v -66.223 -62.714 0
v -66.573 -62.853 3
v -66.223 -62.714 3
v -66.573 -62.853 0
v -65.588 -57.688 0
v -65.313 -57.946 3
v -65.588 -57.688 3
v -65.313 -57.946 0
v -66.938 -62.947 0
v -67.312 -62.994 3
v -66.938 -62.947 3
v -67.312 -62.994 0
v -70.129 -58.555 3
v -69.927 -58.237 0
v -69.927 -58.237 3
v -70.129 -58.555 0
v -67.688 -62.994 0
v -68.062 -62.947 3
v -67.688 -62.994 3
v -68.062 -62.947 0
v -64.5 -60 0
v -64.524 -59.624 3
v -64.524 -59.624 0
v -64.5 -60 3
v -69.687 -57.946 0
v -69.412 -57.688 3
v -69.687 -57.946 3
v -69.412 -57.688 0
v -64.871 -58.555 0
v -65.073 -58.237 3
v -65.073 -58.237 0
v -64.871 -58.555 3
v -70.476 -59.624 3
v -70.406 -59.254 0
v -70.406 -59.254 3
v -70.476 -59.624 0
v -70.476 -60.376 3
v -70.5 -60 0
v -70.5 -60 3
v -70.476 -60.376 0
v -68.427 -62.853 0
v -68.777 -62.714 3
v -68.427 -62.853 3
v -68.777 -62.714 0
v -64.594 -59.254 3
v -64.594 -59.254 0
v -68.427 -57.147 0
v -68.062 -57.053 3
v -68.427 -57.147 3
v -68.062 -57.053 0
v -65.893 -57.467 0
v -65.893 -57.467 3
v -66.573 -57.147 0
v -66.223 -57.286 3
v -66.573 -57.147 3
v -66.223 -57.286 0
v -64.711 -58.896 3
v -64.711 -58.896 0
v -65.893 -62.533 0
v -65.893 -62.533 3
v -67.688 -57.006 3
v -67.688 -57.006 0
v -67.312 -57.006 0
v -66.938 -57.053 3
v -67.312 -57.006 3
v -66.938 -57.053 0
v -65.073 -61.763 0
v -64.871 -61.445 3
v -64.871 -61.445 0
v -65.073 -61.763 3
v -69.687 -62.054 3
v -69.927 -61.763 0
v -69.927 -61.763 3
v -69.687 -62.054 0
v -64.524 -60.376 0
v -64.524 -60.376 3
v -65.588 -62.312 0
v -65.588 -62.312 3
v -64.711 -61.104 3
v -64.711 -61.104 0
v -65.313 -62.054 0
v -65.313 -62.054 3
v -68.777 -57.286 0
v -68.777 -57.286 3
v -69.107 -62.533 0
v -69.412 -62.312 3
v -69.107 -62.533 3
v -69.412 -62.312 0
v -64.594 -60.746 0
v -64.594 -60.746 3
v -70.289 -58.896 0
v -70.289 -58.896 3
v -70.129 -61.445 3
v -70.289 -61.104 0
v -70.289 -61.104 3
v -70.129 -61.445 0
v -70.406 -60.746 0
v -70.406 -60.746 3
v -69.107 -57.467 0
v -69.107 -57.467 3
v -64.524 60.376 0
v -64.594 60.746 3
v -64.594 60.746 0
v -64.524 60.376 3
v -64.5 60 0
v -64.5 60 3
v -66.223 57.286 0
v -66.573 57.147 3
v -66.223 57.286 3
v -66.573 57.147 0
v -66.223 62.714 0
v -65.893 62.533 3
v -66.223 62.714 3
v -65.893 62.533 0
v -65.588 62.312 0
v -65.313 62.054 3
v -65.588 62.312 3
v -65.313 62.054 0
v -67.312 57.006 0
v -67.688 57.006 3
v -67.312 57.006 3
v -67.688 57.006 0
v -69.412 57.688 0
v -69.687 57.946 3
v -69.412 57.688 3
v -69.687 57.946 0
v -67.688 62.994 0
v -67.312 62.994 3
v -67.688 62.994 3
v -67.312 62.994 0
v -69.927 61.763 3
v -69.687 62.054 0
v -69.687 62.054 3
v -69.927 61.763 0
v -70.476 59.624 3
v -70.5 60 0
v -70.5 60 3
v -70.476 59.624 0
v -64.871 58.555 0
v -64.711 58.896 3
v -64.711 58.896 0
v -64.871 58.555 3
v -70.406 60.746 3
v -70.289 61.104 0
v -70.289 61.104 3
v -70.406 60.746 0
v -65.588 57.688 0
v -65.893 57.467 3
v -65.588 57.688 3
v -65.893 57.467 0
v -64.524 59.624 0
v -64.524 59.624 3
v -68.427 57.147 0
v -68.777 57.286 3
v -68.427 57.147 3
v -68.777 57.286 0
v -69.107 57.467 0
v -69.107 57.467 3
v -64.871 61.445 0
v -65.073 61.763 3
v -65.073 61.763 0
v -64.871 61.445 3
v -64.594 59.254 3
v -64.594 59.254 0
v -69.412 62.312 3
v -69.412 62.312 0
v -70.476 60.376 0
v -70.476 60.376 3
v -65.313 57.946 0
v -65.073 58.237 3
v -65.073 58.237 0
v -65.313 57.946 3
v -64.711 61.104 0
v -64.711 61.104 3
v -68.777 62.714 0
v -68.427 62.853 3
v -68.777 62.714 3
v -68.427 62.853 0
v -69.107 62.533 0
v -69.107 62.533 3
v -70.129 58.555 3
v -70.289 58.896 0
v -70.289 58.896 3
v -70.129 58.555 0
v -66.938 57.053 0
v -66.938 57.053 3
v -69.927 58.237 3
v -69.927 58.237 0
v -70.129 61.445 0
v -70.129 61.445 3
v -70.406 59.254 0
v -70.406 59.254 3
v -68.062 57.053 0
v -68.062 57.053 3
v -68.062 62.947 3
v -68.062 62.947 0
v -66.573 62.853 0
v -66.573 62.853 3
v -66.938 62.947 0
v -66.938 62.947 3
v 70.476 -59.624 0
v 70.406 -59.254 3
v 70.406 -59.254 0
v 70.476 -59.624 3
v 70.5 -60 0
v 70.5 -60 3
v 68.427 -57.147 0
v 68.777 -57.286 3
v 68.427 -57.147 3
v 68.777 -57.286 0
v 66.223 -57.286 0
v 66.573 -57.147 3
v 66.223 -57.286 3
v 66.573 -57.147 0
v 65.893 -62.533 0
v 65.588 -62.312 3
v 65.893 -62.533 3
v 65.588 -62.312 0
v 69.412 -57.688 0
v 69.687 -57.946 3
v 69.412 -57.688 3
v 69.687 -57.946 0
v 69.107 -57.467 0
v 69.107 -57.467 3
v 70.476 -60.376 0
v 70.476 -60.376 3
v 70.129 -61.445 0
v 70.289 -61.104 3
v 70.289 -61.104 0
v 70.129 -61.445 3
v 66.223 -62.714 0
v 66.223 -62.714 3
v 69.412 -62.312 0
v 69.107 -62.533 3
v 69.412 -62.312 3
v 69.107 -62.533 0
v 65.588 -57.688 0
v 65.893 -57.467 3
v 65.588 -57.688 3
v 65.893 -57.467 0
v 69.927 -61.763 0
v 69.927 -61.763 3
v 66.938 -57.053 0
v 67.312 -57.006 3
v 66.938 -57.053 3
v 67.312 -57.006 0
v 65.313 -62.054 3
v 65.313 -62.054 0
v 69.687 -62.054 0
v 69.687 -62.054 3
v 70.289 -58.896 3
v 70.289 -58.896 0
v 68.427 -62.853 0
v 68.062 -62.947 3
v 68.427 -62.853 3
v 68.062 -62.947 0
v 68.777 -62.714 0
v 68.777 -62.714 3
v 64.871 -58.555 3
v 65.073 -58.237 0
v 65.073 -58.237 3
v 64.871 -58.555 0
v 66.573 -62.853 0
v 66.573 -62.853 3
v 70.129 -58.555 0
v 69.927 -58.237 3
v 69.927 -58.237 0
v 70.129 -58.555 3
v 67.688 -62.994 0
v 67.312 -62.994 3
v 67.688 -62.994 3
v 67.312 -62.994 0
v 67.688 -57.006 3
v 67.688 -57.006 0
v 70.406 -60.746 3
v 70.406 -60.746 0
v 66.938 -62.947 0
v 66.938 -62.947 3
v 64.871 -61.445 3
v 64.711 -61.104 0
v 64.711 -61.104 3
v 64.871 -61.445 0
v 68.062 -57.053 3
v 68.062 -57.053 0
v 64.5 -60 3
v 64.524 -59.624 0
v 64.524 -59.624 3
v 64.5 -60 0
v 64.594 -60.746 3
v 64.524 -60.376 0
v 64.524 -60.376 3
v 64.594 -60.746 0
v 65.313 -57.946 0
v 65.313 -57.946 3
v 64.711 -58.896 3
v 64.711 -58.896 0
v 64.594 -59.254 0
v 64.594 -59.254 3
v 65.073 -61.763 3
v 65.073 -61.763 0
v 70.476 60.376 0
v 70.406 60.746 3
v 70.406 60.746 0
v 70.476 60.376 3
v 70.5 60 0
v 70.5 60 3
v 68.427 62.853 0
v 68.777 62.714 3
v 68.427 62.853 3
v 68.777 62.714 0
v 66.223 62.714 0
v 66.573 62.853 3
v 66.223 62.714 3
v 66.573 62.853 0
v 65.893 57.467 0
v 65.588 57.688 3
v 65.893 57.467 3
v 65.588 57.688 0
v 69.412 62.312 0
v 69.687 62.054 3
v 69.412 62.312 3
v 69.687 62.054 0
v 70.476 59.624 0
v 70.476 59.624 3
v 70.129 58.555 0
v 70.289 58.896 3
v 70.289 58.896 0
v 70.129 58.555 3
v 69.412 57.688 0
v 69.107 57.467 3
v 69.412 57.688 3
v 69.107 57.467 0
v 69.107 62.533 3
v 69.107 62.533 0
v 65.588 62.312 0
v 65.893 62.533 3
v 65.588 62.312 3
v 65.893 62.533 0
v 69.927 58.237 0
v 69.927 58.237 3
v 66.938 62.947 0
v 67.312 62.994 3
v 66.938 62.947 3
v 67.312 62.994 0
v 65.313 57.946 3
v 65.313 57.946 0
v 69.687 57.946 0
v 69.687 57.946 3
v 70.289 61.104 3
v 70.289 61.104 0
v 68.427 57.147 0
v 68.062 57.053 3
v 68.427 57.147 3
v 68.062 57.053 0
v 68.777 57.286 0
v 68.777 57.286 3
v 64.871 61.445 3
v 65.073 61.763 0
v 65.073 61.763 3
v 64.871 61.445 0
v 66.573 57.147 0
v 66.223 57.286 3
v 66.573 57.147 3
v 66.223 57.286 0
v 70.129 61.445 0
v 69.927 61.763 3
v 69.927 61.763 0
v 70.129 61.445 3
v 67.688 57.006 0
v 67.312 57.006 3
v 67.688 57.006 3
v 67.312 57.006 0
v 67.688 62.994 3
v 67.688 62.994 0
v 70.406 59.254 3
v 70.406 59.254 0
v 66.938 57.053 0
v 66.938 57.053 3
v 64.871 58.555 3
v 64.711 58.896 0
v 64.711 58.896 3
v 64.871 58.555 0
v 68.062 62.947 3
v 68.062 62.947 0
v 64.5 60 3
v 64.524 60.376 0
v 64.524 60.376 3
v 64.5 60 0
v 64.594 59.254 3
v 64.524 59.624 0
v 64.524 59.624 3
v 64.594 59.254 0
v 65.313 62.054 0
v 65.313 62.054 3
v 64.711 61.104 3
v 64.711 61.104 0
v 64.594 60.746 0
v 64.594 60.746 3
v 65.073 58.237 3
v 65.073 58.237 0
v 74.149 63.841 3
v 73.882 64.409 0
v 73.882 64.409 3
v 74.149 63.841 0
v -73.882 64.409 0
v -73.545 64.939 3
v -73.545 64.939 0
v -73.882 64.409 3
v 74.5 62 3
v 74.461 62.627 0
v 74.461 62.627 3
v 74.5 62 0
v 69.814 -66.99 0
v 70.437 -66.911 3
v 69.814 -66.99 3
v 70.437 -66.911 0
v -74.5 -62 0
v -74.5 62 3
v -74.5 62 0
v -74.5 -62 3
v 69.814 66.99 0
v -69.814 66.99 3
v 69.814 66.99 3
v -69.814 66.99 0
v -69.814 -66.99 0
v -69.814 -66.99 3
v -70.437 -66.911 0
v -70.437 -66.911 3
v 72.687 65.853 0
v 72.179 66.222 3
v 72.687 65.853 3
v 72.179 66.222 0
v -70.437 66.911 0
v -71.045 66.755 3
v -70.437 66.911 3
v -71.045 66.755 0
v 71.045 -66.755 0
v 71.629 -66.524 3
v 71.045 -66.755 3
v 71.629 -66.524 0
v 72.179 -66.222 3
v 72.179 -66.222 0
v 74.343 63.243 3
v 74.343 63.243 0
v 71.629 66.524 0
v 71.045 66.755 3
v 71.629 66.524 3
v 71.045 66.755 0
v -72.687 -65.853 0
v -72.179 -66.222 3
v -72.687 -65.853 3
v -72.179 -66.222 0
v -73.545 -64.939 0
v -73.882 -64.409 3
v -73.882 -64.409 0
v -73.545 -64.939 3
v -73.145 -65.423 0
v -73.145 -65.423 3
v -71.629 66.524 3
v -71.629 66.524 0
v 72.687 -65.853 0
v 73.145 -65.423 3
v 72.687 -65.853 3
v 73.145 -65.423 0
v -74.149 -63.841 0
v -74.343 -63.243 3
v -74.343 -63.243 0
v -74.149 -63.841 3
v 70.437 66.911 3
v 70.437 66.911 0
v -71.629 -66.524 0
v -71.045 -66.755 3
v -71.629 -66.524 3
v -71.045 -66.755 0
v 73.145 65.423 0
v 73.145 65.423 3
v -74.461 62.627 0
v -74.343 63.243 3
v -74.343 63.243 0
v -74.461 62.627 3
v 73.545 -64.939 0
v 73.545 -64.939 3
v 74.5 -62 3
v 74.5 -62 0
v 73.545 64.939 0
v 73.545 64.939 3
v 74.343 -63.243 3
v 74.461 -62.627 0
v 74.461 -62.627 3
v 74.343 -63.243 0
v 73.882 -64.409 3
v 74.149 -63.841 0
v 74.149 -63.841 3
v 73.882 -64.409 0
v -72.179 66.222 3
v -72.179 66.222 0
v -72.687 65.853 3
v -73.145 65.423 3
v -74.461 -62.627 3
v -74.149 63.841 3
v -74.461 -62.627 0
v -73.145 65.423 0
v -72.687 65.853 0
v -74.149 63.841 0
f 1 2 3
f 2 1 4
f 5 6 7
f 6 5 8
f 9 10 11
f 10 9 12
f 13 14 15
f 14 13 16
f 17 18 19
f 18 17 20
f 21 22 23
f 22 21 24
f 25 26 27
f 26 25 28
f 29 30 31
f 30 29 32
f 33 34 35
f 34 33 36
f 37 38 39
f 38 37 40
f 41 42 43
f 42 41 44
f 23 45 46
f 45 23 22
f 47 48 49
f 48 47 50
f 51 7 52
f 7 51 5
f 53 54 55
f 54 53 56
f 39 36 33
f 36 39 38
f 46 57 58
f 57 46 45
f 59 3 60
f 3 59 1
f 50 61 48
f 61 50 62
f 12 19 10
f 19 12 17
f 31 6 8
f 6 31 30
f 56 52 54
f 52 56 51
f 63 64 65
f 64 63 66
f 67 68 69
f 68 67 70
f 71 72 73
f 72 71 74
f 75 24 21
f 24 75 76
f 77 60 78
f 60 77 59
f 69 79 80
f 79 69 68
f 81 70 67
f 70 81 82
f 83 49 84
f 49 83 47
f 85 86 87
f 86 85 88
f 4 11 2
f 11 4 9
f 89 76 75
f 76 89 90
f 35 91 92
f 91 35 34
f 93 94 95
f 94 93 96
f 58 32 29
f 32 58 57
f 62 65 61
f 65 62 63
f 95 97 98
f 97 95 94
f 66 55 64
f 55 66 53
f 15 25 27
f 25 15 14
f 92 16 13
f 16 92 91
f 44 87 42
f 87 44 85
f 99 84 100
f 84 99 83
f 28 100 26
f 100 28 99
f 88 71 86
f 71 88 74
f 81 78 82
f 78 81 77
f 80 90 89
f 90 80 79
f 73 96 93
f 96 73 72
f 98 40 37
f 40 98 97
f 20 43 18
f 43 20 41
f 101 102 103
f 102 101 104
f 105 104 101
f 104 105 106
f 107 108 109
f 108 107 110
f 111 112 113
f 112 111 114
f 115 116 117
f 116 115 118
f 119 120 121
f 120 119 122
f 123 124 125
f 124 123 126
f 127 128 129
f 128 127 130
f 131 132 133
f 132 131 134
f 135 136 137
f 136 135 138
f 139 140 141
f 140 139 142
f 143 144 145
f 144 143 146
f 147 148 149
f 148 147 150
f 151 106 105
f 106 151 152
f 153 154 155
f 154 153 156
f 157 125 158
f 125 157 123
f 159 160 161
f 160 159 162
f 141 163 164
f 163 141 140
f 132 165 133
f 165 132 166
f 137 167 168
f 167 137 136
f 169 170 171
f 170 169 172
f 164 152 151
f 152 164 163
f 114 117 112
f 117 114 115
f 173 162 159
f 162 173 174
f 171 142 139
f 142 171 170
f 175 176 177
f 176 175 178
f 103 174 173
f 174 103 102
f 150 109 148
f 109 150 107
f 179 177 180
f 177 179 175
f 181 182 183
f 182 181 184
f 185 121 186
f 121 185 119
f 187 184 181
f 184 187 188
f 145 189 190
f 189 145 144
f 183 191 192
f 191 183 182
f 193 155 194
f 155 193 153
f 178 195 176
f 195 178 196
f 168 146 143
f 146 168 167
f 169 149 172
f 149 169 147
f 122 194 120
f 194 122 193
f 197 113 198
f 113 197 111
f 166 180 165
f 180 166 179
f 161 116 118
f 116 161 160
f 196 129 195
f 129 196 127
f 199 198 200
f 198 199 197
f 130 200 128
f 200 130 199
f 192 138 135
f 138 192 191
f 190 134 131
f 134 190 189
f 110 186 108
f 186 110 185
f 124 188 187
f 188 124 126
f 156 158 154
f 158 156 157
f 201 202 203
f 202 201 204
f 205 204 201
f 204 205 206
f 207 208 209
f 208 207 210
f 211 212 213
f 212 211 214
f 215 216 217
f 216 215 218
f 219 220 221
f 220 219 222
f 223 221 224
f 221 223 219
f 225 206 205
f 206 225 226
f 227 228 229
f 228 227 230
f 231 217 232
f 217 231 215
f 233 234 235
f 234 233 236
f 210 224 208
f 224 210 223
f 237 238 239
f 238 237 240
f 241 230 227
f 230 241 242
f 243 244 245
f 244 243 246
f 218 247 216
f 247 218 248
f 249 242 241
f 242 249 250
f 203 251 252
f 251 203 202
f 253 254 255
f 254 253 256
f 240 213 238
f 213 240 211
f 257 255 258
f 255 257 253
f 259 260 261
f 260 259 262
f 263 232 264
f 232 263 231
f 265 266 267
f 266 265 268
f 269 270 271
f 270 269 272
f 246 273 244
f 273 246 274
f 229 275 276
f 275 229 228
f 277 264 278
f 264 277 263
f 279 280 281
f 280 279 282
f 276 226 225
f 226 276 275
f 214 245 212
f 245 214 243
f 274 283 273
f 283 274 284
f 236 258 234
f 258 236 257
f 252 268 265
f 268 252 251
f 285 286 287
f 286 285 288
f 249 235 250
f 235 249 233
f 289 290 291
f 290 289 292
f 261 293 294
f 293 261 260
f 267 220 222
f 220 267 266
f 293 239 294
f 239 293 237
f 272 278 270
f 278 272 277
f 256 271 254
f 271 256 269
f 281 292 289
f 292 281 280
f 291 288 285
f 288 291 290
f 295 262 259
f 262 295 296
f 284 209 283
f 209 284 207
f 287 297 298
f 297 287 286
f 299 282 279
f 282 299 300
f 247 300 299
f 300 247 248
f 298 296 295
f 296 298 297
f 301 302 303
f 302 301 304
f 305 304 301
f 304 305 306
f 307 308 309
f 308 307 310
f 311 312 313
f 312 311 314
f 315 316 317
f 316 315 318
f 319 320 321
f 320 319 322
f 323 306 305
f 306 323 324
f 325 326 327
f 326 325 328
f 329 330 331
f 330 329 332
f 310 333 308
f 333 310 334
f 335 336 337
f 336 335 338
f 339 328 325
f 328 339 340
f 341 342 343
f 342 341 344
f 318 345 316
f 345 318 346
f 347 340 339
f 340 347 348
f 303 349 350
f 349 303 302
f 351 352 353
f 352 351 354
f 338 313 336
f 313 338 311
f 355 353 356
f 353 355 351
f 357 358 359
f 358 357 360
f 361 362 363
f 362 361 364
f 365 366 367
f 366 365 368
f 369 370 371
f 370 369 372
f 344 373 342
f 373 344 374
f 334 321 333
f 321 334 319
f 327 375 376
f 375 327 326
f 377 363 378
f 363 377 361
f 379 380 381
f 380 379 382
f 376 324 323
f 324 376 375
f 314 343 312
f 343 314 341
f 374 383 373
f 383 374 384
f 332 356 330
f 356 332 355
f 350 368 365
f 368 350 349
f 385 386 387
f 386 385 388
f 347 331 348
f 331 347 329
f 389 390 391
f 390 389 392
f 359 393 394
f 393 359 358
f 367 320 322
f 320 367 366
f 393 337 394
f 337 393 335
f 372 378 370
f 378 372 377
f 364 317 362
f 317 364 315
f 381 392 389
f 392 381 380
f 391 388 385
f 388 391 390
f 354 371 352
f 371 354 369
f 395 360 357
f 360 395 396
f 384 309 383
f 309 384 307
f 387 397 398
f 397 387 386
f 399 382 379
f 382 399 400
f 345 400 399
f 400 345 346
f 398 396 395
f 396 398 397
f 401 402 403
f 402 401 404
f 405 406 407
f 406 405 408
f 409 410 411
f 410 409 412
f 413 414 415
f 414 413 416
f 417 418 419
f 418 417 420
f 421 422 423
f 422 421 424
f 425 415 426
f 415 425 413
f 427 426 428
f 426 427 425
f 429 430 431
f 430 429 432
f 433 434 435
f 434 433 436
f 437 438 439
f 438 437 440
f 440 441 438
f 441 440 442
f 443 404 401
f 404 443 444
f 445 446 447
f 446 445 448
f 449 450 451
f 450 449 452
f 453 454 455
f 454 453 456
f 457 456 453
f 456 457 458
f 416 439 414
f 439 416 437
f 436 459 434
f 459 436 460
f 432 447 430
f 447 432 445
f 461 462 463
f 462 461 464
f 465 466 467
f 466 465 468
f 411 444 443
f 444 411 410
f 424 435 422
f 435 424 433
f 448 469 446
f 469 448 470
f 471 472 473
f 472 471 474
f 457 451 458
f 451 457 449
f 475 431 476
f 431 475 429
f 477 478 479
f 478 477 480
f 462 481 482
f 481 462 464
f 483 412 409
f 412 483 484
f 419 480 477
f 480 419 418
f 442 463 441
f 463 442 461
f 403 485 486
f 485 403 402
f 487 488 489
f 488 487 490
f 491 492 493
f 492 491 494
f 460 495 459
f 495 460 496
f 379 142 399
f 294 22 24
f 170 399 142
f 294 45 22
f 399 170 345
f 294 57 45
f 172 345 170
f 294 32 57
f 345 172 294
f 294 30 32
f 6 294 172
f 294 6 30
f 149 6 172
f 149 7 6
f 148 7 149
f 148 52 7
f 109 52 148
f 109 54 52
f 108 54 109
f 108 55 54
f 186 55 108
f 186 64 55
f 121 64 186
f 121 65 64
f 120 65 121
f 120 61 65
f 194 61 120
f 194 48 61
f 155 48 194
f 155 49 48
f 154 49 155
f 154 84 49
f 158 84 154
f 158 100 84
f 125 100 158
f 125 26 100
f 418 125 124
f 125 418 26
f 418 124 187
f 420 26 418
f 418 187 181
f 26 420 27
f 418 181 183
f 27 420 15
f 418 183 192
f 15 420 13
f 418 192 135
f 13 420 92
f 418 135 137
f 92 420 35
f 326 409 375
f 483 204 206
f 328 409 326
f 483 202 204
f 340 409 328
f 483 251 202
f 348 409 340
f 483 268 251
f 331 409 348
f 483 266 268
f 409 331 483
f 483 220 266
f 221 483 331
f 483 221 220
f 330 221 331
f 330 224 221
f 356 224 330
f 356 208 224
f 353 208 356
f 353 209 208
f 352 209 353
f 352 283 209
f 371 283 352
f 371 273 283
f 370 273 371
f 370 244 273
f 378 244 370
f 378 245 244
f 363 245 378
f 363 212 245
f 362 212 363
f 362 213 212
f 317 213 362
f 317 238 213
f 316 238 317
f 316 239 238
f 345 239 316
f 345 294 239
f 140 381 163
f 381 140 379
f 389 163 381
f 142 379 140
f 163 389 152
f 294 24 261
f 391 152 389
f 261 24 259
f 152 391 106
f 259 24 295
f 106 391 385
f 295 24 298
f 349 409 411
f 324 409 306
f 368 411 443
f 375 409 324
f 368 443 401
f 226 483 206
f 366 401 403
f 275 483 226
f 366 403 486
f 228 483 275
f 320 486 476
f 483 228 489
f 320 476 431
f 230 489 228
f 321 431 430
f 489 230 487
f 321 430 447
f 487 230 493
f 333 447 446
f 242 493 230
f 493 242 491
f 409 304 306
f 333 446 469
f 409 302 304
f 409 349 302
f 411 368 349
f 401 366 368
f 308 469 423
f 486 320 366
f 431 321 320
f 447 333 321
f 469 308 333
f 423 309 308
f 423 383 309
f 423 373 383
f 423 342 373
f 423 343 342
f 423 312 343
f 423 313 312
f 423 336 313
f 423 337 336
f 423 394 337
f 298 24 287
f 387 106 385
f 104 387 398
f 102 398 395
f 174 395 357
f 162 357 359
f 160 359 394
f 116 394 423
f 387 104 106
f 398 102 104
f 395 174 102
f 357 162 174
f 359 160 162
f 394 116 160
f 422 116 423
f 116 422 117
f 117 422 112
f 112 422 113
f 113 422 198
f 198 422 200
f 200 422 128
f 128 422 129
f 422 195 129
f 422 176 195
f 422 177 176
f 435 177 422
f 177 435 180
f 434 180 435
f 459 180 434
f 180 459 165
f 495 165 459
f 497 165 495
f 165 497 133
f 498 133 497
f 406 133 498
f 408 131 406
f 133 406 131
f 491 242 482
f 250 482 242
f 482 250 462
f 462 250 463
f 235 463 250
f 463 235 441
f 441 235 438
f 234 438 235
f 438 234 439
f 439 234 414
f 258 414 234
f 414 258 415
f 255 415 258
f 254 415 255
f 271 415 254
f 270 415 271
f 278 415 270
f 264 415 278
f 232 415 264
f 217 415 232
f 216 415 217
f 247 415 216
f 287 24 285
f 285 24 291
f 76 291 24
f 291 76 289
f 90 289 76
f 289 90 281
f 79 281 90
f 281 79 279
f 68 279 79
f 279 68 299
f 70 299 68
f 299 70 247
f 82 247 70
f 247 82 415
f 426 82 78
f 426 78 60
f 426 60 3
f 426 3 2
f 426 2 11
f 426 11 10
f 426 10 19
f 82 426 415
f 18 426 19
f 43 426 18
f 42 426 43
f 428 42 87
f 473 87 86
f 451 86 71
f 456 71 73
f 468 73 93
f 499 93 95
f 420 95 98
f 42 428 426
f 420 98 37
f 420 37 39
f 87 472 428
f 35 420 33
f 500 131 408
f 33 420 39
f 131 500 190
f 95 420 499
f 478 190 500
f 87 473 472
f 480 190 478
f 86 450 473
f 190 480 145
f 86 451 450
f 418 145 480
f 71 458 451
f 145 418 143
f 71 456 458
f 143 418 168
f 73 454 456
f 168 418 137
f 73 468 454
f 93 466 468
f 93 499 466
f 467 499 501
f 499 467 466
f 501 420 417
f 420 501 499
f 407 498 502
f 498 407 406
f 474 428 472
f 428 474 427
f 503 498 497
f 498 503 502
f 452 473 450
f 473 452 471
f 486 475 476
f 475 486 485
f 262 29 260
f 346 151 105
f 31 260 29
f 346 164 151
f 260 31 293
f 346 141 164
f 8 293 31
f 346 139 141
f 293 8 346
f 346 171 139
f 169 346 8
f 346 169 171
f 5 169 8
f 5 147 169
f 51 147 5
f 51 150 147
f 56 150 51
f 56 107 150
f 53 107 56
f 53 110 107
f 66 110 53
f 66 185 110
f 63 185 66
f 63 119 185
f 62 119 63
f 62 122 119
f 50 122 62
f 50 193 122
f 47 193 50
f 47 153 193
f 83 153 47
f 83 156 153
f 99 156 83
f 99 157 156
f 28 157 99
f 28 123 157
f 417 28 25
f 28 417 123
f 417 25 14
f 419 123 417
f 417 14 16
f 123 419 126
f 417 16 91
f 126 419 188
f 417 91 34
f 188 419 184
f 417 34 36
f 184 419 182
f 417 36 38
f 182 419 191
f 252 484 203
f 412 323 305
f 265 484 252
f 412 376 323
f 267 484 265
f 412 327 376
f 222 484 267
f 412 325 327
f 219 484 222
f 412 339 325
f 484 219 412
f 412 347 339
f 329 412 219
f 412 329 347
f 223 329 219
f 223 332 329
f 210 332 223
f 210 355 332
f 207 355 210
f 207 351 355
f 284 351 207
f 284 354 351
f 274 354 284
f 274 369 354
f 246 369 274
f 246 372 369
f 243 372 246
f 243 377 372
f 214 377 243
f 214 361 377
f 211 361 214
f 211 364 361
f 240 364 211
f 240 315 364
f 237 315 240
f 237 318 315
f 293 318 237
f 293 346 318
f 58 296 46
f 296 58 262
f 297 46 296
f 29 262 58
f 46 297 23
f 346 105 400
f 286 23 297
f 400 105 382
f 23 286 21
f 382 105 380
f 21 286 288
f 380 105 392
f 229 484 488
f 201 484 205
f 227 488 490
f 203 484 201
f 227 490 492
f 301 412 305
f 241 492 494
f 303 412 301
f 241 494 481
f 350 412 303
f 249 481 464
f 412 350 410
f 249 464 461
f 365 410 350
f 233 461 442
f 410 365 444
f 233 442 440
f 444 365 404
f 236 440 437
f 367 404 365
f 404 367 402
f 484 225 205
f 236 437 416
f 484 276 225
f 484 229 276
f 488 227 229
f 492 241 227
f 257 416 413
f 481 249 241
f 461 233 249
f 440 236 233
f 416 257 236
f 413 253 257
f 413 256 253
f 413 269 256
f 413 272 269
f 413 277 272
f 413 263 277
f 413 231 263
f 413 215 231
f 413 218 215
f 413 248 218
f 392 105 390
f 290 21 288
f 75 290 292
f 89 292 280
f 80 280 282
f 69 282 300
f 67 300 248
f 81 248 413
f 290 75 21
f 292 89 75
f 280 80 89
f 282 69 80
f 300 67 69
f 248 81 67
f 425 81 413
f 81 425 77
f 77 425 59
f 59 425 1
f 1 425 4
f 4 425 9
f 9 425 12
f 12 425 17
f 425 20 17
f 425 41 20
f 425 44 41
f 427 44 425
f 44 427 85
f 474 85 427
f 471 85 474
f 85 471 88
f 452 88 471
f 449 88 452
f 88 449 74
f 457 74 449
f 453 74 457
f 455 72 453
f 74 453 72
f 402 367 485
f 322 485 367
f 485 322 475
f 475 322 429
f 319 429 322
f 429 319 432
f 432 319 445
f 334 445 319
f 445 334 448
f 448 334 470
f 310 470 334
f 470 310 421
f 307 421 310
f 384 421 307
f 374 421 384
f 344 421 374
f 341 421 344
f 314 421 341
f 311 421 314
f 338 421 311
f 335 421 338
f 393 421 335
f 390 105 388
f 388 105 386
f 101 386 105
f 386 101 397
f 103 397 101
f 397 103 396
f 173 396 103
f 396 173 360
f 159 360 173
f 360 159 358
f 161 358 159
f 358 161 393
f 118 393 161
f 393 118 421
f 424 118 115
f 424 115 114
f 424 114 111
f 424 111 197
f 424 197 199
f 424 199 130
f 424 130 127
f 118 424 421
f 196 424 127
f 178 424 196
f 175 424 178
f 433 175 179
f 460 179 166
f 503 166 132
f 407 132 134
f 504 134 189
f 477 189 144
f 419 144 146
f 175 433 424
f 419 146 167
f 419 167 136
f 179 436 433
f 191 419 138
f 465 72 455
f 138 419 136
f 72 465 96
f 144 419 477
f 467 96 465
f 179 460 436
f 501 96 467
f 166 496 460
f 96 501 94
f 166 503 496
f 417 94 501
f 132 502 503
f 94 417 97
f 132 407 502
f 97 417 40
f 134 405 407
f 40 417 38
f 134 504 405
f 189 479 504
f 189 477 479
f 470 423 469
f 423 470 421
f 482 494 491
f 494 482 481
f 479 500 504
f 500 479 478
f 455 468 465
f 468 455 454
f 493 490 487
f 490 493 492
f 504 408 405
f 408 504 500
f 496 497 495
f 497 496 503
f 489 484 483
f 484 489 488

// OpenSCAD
$fn = 50;


difference() {
	union() {
		hull() {
			translate(v = [-69.5000000000, 62.0000000000, 0]) {
				cylinder(h = 3, r = 5);
			}
			translate(v = [69.5000000000, 62.0000000000, 0]) {
				cylinder(h = 3, r = 5);
			}
			translate(v = [-69.5000000000, -62.0000000000, 0]) {
				cylinder(h = 3, r = 5);
			}
			translate(v = [69.5000000000, -62.0000000000, 0]) {
				cylinder(h = 3, r = 5);
			}
		}
	}
	union() {
		translate(v = [-67.5000000000, -60.0000000000, -100.0000000000]) {
			cylinder(h = 200, r = 3.0000000000);
		}
		translate(v = [-67.5000000000, 60.0000000000, -100.0000000000]) {
			cylinder(h = 200, r = 3.0000000000);
		}
		translate(v = [67.5000000000, -60.0000000000, -100.0000000000]) {
			cylinder(h = 200, r = 3.0000000000);
		}
		translate(v = [67.5000000000, 60.0000000000, -100.0000000000]) {
			cylinder(h = 200, r = 3.0000000000);
		}
	}
}
